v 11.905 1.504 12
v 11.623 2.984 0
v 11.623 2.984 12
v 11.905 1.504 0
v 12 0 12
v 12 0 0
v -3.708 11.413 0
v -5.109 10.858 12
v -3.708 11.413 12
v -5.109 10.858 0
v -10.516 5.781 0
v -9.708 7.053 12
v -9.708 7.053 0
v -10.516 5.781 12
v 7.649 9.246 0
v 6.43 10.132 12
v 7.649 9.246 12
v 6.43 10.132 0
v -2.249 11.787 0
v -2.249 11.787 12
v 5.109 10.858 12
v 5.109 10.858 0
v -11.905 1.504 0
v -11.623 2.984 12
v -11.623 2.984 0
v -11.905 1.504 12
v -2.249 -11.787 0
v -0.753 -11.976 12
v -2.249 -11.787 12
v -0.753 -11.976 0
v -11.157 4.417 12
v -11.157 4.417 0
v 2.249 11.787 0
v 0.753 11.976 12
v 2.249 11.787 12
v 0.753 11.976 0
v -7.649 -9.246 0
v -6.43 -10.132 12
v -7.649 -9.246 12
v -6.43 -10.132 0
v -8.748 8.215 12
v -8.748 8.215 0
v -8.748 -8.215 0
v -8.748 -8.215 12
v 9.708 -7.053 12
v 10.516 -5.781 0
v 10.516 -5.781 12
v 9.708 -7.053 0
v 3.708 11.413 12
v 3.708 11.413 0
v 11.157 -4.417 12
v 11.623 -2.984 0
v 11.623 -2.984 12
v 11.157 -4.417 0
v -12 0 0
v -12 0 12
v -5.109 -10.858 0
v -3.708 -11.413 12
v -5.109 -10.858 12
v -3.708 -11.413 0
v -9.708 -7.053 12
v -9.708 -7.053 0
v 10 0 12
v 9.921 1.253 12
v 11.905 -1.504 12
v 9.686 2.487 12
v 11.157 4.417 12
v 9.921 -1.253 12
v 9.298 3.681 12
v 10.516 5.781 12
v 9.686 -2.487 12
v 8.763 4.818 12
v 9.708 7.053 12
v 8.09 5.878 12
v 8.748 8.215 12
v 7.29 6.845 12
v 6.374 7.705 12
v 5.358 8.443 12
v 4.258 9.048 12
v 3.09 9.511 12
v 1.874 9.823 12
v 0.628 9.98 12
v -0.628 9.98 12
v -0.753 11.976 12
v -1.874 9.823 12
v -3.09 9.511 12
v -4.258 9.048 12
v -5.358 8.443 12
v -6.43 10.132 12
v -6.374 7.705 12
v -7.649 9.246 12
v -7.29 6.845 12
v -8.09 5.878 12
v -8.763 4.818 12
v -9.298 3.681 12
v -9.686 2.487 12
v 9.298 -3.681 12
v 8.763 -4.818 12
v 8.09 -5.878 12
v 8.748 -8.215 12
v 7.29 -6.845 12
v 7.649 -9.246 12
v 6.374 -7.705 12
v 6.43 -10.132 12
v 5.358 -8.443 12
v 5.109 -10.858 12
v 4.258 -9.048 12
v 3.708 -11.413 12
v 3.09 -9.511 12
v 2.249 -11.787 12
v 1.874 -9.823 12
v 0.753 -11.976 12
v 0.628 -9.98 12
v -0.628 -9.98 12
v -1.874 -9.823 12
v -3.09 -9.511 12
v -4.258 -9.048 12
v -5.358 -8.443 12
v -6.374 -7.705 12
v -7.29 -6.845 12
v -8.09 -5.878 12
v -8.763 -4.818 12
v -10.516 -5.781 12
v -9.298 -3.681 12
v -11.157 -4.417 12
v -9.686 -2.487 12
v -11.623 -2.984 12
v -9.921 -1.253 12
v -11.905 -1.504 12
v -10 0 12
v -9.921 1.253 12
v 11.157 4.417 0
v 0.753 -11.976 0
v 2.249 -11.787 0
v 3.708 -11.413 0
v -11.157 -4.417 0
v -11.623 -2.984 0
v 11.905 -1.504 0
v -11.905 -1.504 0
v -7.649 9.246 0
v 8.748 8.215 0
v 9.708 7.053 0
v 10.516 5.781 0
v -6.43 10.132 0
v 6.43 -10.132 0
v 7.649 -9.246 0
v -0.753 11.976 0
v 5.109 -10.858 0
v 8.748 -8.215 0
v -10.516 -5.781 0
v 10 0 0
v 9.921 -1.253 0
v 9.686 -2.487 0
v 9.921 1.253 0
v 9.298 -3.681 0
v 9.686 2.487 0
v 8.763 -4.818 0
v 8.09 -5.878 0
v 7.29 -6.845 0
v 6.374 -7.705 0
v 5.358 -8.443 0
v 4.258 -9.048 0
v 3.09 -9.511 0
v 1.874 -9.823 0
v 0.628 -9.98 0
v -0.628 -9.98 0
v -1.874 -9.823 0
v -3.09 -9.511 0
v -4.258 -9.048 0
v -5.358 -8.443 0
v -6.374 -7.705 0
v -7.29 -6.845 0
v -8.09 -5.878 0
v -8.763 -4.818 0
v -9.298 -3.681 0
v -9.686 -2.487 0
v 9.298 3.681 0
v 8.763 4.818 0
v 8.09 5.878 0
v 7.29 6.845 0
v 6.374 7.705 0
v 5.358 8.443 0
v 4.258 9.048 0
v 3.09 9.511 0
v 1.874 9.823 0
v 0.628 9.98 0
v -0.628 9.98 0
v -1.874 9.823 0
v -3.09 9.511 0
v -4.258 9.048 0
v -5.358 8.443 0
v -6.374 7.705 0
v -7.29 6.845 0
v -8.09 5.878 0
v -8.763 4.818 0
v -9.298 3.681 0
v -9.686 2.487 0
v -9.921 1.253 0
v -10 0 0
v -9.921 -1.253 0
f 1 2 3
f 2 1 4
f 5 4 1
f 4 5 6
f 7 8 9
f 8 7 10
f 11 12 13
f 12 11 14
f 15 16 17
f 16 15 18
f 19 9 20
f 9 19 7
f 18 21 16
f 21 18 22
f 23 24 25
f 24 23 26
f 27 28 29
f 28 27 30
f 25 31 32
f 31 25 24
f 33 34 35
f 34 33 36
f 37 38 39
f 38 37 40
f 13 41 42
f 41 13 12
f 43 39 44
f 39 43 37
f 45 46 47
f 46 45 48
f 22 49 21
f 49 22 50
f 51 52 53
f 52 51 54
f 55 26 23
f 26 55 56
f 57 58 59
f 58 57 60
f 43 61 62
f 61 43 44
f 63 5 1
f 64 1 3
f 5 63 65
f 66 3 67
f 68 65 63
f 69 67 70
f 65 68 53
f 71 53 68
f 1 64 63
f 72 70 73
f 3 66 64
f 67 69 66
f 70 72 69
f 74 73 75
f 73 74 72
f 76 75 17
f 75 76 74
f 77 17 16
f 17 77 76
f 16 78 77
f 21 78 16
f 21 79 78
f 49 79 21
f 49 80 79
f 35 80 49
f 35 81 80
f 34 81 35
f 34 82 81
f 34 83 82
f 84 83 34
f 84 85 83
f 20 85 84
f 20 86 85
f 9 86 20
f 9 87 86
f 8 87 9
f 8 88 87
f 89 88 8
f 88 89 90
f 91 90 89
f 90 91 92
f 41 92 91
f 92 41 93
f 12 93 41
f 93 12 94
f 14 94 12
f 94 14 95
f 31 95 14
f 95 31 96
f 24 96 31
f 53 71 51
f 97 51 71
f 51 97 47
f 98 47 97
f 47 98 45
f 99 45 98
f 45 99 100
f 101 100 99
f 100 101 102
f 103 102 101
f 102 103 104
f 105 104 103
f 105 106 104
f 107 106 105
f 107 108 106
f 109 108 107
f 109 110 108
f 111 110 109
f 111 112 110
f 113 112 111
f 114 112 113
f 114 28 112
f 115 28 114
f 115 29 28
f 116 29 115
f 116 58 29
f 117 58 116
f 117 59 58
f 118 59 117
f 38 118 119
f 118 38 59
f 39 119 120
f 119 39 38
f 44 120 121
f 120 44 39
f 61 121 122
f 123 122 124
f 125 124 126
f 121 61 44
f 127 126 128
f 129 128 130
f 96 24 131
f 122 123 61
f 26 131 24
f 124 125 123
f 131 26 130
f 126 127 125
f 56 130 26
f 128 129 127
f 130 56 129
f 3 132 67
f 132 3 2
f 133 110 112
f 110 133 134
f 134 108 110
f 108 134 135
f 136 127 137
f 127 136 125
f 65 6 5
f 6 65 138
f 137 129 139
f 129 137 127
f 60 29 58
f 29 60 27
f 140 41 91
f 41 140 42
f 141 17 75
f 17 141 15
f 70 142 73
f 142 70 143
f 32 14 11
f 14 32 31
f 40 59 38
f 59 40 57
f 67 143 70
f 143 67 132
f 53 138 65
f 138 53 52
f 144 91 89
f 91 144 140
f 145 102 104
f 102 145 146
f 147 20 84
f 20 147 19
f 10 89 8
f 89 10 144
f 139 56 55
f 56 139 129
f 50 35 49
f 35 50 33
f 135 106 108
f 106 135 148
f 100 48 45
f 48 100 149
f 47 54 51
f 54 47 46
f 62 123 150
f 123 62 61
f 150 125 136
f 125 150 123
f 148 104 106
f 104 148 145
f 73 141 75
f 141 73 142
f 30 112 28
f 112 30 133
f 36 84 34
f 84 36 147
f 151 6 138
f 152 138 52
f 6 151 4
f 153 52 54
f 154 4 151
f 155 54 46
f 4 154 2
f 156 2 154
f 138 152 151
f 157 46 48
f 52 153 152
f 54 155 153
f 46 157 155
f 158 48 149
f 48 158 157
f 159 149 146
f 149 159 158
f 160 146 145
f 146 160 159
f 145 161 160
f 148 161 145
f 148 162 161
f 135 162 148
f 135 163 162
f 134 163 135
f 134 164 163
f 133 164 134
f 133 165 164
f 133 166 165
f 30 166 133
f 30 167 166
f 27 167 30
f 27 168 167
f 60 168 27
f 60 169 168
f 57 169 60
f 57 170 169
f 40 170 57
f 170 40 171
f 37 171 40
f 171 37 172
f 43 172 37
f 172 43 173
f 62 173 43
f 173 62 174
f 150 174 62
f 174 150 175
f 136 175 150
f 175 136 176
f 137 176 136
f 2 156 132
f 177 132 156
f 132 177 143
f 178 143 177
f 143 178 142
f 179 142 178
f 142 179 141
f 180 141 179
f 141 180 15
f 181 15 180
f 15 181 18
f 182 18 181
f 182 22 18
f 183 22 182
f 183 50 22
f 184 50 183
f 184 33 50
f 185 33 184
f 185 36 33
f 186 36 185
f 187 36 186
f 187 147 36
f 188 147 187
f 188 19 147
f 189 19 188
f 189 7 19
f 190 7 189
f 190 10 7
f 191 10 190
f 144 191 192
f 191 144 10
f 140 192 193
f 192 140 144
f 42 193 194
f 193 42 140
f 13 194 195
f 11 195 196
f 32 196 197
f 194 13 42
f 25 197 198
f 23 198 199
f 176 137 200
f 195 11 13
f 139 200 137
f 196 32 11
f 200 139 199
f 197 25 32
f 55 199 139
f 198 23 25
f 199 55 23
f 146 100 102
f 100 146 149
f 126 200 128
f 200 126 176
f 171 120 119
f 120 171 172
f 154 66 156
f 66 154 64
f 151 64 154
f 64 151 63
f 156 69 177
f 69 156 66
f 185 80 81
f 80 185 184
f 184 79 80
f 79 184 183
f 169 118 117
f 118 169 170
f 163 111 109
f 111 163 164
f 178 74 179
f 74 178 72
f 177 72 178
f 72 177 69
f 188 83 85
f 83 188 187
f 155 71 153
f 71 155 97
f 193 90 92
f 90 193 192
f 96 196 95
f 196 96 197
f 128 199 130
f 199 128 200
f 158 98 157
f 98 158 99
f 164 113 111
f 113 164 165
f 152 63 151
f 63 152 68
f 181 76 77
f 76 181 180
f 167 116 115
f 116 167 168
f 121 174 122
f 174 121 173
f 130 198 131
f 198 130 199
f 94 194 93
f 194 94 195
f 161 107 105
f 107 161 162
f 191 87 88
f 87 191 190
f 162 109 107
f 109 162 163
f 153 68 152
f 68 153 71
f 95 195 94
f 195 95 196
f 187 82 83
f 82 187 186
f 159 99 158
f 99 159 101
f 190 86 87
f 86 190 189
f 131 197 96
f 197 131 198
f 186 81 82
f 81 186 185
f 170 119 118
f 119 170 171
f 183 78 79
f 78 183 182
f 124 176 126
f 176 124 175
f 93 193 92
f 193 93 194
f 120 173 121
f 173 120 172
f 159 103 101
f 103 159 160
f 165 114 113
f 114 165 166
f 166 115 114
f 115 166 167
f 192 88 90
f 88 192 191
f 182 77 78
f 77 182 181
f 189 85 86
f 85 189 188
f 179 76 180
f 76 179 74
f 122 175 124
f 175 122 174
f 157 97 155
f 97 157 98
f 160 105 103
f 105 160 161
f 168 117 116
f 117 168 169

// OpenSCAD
$fn = 50;

difference() {
	union() {
		difference() {
			cylinder(h = 12, r = 12);
			cylinder(h = 12, r = 10);
		}
	}
	union();
}
